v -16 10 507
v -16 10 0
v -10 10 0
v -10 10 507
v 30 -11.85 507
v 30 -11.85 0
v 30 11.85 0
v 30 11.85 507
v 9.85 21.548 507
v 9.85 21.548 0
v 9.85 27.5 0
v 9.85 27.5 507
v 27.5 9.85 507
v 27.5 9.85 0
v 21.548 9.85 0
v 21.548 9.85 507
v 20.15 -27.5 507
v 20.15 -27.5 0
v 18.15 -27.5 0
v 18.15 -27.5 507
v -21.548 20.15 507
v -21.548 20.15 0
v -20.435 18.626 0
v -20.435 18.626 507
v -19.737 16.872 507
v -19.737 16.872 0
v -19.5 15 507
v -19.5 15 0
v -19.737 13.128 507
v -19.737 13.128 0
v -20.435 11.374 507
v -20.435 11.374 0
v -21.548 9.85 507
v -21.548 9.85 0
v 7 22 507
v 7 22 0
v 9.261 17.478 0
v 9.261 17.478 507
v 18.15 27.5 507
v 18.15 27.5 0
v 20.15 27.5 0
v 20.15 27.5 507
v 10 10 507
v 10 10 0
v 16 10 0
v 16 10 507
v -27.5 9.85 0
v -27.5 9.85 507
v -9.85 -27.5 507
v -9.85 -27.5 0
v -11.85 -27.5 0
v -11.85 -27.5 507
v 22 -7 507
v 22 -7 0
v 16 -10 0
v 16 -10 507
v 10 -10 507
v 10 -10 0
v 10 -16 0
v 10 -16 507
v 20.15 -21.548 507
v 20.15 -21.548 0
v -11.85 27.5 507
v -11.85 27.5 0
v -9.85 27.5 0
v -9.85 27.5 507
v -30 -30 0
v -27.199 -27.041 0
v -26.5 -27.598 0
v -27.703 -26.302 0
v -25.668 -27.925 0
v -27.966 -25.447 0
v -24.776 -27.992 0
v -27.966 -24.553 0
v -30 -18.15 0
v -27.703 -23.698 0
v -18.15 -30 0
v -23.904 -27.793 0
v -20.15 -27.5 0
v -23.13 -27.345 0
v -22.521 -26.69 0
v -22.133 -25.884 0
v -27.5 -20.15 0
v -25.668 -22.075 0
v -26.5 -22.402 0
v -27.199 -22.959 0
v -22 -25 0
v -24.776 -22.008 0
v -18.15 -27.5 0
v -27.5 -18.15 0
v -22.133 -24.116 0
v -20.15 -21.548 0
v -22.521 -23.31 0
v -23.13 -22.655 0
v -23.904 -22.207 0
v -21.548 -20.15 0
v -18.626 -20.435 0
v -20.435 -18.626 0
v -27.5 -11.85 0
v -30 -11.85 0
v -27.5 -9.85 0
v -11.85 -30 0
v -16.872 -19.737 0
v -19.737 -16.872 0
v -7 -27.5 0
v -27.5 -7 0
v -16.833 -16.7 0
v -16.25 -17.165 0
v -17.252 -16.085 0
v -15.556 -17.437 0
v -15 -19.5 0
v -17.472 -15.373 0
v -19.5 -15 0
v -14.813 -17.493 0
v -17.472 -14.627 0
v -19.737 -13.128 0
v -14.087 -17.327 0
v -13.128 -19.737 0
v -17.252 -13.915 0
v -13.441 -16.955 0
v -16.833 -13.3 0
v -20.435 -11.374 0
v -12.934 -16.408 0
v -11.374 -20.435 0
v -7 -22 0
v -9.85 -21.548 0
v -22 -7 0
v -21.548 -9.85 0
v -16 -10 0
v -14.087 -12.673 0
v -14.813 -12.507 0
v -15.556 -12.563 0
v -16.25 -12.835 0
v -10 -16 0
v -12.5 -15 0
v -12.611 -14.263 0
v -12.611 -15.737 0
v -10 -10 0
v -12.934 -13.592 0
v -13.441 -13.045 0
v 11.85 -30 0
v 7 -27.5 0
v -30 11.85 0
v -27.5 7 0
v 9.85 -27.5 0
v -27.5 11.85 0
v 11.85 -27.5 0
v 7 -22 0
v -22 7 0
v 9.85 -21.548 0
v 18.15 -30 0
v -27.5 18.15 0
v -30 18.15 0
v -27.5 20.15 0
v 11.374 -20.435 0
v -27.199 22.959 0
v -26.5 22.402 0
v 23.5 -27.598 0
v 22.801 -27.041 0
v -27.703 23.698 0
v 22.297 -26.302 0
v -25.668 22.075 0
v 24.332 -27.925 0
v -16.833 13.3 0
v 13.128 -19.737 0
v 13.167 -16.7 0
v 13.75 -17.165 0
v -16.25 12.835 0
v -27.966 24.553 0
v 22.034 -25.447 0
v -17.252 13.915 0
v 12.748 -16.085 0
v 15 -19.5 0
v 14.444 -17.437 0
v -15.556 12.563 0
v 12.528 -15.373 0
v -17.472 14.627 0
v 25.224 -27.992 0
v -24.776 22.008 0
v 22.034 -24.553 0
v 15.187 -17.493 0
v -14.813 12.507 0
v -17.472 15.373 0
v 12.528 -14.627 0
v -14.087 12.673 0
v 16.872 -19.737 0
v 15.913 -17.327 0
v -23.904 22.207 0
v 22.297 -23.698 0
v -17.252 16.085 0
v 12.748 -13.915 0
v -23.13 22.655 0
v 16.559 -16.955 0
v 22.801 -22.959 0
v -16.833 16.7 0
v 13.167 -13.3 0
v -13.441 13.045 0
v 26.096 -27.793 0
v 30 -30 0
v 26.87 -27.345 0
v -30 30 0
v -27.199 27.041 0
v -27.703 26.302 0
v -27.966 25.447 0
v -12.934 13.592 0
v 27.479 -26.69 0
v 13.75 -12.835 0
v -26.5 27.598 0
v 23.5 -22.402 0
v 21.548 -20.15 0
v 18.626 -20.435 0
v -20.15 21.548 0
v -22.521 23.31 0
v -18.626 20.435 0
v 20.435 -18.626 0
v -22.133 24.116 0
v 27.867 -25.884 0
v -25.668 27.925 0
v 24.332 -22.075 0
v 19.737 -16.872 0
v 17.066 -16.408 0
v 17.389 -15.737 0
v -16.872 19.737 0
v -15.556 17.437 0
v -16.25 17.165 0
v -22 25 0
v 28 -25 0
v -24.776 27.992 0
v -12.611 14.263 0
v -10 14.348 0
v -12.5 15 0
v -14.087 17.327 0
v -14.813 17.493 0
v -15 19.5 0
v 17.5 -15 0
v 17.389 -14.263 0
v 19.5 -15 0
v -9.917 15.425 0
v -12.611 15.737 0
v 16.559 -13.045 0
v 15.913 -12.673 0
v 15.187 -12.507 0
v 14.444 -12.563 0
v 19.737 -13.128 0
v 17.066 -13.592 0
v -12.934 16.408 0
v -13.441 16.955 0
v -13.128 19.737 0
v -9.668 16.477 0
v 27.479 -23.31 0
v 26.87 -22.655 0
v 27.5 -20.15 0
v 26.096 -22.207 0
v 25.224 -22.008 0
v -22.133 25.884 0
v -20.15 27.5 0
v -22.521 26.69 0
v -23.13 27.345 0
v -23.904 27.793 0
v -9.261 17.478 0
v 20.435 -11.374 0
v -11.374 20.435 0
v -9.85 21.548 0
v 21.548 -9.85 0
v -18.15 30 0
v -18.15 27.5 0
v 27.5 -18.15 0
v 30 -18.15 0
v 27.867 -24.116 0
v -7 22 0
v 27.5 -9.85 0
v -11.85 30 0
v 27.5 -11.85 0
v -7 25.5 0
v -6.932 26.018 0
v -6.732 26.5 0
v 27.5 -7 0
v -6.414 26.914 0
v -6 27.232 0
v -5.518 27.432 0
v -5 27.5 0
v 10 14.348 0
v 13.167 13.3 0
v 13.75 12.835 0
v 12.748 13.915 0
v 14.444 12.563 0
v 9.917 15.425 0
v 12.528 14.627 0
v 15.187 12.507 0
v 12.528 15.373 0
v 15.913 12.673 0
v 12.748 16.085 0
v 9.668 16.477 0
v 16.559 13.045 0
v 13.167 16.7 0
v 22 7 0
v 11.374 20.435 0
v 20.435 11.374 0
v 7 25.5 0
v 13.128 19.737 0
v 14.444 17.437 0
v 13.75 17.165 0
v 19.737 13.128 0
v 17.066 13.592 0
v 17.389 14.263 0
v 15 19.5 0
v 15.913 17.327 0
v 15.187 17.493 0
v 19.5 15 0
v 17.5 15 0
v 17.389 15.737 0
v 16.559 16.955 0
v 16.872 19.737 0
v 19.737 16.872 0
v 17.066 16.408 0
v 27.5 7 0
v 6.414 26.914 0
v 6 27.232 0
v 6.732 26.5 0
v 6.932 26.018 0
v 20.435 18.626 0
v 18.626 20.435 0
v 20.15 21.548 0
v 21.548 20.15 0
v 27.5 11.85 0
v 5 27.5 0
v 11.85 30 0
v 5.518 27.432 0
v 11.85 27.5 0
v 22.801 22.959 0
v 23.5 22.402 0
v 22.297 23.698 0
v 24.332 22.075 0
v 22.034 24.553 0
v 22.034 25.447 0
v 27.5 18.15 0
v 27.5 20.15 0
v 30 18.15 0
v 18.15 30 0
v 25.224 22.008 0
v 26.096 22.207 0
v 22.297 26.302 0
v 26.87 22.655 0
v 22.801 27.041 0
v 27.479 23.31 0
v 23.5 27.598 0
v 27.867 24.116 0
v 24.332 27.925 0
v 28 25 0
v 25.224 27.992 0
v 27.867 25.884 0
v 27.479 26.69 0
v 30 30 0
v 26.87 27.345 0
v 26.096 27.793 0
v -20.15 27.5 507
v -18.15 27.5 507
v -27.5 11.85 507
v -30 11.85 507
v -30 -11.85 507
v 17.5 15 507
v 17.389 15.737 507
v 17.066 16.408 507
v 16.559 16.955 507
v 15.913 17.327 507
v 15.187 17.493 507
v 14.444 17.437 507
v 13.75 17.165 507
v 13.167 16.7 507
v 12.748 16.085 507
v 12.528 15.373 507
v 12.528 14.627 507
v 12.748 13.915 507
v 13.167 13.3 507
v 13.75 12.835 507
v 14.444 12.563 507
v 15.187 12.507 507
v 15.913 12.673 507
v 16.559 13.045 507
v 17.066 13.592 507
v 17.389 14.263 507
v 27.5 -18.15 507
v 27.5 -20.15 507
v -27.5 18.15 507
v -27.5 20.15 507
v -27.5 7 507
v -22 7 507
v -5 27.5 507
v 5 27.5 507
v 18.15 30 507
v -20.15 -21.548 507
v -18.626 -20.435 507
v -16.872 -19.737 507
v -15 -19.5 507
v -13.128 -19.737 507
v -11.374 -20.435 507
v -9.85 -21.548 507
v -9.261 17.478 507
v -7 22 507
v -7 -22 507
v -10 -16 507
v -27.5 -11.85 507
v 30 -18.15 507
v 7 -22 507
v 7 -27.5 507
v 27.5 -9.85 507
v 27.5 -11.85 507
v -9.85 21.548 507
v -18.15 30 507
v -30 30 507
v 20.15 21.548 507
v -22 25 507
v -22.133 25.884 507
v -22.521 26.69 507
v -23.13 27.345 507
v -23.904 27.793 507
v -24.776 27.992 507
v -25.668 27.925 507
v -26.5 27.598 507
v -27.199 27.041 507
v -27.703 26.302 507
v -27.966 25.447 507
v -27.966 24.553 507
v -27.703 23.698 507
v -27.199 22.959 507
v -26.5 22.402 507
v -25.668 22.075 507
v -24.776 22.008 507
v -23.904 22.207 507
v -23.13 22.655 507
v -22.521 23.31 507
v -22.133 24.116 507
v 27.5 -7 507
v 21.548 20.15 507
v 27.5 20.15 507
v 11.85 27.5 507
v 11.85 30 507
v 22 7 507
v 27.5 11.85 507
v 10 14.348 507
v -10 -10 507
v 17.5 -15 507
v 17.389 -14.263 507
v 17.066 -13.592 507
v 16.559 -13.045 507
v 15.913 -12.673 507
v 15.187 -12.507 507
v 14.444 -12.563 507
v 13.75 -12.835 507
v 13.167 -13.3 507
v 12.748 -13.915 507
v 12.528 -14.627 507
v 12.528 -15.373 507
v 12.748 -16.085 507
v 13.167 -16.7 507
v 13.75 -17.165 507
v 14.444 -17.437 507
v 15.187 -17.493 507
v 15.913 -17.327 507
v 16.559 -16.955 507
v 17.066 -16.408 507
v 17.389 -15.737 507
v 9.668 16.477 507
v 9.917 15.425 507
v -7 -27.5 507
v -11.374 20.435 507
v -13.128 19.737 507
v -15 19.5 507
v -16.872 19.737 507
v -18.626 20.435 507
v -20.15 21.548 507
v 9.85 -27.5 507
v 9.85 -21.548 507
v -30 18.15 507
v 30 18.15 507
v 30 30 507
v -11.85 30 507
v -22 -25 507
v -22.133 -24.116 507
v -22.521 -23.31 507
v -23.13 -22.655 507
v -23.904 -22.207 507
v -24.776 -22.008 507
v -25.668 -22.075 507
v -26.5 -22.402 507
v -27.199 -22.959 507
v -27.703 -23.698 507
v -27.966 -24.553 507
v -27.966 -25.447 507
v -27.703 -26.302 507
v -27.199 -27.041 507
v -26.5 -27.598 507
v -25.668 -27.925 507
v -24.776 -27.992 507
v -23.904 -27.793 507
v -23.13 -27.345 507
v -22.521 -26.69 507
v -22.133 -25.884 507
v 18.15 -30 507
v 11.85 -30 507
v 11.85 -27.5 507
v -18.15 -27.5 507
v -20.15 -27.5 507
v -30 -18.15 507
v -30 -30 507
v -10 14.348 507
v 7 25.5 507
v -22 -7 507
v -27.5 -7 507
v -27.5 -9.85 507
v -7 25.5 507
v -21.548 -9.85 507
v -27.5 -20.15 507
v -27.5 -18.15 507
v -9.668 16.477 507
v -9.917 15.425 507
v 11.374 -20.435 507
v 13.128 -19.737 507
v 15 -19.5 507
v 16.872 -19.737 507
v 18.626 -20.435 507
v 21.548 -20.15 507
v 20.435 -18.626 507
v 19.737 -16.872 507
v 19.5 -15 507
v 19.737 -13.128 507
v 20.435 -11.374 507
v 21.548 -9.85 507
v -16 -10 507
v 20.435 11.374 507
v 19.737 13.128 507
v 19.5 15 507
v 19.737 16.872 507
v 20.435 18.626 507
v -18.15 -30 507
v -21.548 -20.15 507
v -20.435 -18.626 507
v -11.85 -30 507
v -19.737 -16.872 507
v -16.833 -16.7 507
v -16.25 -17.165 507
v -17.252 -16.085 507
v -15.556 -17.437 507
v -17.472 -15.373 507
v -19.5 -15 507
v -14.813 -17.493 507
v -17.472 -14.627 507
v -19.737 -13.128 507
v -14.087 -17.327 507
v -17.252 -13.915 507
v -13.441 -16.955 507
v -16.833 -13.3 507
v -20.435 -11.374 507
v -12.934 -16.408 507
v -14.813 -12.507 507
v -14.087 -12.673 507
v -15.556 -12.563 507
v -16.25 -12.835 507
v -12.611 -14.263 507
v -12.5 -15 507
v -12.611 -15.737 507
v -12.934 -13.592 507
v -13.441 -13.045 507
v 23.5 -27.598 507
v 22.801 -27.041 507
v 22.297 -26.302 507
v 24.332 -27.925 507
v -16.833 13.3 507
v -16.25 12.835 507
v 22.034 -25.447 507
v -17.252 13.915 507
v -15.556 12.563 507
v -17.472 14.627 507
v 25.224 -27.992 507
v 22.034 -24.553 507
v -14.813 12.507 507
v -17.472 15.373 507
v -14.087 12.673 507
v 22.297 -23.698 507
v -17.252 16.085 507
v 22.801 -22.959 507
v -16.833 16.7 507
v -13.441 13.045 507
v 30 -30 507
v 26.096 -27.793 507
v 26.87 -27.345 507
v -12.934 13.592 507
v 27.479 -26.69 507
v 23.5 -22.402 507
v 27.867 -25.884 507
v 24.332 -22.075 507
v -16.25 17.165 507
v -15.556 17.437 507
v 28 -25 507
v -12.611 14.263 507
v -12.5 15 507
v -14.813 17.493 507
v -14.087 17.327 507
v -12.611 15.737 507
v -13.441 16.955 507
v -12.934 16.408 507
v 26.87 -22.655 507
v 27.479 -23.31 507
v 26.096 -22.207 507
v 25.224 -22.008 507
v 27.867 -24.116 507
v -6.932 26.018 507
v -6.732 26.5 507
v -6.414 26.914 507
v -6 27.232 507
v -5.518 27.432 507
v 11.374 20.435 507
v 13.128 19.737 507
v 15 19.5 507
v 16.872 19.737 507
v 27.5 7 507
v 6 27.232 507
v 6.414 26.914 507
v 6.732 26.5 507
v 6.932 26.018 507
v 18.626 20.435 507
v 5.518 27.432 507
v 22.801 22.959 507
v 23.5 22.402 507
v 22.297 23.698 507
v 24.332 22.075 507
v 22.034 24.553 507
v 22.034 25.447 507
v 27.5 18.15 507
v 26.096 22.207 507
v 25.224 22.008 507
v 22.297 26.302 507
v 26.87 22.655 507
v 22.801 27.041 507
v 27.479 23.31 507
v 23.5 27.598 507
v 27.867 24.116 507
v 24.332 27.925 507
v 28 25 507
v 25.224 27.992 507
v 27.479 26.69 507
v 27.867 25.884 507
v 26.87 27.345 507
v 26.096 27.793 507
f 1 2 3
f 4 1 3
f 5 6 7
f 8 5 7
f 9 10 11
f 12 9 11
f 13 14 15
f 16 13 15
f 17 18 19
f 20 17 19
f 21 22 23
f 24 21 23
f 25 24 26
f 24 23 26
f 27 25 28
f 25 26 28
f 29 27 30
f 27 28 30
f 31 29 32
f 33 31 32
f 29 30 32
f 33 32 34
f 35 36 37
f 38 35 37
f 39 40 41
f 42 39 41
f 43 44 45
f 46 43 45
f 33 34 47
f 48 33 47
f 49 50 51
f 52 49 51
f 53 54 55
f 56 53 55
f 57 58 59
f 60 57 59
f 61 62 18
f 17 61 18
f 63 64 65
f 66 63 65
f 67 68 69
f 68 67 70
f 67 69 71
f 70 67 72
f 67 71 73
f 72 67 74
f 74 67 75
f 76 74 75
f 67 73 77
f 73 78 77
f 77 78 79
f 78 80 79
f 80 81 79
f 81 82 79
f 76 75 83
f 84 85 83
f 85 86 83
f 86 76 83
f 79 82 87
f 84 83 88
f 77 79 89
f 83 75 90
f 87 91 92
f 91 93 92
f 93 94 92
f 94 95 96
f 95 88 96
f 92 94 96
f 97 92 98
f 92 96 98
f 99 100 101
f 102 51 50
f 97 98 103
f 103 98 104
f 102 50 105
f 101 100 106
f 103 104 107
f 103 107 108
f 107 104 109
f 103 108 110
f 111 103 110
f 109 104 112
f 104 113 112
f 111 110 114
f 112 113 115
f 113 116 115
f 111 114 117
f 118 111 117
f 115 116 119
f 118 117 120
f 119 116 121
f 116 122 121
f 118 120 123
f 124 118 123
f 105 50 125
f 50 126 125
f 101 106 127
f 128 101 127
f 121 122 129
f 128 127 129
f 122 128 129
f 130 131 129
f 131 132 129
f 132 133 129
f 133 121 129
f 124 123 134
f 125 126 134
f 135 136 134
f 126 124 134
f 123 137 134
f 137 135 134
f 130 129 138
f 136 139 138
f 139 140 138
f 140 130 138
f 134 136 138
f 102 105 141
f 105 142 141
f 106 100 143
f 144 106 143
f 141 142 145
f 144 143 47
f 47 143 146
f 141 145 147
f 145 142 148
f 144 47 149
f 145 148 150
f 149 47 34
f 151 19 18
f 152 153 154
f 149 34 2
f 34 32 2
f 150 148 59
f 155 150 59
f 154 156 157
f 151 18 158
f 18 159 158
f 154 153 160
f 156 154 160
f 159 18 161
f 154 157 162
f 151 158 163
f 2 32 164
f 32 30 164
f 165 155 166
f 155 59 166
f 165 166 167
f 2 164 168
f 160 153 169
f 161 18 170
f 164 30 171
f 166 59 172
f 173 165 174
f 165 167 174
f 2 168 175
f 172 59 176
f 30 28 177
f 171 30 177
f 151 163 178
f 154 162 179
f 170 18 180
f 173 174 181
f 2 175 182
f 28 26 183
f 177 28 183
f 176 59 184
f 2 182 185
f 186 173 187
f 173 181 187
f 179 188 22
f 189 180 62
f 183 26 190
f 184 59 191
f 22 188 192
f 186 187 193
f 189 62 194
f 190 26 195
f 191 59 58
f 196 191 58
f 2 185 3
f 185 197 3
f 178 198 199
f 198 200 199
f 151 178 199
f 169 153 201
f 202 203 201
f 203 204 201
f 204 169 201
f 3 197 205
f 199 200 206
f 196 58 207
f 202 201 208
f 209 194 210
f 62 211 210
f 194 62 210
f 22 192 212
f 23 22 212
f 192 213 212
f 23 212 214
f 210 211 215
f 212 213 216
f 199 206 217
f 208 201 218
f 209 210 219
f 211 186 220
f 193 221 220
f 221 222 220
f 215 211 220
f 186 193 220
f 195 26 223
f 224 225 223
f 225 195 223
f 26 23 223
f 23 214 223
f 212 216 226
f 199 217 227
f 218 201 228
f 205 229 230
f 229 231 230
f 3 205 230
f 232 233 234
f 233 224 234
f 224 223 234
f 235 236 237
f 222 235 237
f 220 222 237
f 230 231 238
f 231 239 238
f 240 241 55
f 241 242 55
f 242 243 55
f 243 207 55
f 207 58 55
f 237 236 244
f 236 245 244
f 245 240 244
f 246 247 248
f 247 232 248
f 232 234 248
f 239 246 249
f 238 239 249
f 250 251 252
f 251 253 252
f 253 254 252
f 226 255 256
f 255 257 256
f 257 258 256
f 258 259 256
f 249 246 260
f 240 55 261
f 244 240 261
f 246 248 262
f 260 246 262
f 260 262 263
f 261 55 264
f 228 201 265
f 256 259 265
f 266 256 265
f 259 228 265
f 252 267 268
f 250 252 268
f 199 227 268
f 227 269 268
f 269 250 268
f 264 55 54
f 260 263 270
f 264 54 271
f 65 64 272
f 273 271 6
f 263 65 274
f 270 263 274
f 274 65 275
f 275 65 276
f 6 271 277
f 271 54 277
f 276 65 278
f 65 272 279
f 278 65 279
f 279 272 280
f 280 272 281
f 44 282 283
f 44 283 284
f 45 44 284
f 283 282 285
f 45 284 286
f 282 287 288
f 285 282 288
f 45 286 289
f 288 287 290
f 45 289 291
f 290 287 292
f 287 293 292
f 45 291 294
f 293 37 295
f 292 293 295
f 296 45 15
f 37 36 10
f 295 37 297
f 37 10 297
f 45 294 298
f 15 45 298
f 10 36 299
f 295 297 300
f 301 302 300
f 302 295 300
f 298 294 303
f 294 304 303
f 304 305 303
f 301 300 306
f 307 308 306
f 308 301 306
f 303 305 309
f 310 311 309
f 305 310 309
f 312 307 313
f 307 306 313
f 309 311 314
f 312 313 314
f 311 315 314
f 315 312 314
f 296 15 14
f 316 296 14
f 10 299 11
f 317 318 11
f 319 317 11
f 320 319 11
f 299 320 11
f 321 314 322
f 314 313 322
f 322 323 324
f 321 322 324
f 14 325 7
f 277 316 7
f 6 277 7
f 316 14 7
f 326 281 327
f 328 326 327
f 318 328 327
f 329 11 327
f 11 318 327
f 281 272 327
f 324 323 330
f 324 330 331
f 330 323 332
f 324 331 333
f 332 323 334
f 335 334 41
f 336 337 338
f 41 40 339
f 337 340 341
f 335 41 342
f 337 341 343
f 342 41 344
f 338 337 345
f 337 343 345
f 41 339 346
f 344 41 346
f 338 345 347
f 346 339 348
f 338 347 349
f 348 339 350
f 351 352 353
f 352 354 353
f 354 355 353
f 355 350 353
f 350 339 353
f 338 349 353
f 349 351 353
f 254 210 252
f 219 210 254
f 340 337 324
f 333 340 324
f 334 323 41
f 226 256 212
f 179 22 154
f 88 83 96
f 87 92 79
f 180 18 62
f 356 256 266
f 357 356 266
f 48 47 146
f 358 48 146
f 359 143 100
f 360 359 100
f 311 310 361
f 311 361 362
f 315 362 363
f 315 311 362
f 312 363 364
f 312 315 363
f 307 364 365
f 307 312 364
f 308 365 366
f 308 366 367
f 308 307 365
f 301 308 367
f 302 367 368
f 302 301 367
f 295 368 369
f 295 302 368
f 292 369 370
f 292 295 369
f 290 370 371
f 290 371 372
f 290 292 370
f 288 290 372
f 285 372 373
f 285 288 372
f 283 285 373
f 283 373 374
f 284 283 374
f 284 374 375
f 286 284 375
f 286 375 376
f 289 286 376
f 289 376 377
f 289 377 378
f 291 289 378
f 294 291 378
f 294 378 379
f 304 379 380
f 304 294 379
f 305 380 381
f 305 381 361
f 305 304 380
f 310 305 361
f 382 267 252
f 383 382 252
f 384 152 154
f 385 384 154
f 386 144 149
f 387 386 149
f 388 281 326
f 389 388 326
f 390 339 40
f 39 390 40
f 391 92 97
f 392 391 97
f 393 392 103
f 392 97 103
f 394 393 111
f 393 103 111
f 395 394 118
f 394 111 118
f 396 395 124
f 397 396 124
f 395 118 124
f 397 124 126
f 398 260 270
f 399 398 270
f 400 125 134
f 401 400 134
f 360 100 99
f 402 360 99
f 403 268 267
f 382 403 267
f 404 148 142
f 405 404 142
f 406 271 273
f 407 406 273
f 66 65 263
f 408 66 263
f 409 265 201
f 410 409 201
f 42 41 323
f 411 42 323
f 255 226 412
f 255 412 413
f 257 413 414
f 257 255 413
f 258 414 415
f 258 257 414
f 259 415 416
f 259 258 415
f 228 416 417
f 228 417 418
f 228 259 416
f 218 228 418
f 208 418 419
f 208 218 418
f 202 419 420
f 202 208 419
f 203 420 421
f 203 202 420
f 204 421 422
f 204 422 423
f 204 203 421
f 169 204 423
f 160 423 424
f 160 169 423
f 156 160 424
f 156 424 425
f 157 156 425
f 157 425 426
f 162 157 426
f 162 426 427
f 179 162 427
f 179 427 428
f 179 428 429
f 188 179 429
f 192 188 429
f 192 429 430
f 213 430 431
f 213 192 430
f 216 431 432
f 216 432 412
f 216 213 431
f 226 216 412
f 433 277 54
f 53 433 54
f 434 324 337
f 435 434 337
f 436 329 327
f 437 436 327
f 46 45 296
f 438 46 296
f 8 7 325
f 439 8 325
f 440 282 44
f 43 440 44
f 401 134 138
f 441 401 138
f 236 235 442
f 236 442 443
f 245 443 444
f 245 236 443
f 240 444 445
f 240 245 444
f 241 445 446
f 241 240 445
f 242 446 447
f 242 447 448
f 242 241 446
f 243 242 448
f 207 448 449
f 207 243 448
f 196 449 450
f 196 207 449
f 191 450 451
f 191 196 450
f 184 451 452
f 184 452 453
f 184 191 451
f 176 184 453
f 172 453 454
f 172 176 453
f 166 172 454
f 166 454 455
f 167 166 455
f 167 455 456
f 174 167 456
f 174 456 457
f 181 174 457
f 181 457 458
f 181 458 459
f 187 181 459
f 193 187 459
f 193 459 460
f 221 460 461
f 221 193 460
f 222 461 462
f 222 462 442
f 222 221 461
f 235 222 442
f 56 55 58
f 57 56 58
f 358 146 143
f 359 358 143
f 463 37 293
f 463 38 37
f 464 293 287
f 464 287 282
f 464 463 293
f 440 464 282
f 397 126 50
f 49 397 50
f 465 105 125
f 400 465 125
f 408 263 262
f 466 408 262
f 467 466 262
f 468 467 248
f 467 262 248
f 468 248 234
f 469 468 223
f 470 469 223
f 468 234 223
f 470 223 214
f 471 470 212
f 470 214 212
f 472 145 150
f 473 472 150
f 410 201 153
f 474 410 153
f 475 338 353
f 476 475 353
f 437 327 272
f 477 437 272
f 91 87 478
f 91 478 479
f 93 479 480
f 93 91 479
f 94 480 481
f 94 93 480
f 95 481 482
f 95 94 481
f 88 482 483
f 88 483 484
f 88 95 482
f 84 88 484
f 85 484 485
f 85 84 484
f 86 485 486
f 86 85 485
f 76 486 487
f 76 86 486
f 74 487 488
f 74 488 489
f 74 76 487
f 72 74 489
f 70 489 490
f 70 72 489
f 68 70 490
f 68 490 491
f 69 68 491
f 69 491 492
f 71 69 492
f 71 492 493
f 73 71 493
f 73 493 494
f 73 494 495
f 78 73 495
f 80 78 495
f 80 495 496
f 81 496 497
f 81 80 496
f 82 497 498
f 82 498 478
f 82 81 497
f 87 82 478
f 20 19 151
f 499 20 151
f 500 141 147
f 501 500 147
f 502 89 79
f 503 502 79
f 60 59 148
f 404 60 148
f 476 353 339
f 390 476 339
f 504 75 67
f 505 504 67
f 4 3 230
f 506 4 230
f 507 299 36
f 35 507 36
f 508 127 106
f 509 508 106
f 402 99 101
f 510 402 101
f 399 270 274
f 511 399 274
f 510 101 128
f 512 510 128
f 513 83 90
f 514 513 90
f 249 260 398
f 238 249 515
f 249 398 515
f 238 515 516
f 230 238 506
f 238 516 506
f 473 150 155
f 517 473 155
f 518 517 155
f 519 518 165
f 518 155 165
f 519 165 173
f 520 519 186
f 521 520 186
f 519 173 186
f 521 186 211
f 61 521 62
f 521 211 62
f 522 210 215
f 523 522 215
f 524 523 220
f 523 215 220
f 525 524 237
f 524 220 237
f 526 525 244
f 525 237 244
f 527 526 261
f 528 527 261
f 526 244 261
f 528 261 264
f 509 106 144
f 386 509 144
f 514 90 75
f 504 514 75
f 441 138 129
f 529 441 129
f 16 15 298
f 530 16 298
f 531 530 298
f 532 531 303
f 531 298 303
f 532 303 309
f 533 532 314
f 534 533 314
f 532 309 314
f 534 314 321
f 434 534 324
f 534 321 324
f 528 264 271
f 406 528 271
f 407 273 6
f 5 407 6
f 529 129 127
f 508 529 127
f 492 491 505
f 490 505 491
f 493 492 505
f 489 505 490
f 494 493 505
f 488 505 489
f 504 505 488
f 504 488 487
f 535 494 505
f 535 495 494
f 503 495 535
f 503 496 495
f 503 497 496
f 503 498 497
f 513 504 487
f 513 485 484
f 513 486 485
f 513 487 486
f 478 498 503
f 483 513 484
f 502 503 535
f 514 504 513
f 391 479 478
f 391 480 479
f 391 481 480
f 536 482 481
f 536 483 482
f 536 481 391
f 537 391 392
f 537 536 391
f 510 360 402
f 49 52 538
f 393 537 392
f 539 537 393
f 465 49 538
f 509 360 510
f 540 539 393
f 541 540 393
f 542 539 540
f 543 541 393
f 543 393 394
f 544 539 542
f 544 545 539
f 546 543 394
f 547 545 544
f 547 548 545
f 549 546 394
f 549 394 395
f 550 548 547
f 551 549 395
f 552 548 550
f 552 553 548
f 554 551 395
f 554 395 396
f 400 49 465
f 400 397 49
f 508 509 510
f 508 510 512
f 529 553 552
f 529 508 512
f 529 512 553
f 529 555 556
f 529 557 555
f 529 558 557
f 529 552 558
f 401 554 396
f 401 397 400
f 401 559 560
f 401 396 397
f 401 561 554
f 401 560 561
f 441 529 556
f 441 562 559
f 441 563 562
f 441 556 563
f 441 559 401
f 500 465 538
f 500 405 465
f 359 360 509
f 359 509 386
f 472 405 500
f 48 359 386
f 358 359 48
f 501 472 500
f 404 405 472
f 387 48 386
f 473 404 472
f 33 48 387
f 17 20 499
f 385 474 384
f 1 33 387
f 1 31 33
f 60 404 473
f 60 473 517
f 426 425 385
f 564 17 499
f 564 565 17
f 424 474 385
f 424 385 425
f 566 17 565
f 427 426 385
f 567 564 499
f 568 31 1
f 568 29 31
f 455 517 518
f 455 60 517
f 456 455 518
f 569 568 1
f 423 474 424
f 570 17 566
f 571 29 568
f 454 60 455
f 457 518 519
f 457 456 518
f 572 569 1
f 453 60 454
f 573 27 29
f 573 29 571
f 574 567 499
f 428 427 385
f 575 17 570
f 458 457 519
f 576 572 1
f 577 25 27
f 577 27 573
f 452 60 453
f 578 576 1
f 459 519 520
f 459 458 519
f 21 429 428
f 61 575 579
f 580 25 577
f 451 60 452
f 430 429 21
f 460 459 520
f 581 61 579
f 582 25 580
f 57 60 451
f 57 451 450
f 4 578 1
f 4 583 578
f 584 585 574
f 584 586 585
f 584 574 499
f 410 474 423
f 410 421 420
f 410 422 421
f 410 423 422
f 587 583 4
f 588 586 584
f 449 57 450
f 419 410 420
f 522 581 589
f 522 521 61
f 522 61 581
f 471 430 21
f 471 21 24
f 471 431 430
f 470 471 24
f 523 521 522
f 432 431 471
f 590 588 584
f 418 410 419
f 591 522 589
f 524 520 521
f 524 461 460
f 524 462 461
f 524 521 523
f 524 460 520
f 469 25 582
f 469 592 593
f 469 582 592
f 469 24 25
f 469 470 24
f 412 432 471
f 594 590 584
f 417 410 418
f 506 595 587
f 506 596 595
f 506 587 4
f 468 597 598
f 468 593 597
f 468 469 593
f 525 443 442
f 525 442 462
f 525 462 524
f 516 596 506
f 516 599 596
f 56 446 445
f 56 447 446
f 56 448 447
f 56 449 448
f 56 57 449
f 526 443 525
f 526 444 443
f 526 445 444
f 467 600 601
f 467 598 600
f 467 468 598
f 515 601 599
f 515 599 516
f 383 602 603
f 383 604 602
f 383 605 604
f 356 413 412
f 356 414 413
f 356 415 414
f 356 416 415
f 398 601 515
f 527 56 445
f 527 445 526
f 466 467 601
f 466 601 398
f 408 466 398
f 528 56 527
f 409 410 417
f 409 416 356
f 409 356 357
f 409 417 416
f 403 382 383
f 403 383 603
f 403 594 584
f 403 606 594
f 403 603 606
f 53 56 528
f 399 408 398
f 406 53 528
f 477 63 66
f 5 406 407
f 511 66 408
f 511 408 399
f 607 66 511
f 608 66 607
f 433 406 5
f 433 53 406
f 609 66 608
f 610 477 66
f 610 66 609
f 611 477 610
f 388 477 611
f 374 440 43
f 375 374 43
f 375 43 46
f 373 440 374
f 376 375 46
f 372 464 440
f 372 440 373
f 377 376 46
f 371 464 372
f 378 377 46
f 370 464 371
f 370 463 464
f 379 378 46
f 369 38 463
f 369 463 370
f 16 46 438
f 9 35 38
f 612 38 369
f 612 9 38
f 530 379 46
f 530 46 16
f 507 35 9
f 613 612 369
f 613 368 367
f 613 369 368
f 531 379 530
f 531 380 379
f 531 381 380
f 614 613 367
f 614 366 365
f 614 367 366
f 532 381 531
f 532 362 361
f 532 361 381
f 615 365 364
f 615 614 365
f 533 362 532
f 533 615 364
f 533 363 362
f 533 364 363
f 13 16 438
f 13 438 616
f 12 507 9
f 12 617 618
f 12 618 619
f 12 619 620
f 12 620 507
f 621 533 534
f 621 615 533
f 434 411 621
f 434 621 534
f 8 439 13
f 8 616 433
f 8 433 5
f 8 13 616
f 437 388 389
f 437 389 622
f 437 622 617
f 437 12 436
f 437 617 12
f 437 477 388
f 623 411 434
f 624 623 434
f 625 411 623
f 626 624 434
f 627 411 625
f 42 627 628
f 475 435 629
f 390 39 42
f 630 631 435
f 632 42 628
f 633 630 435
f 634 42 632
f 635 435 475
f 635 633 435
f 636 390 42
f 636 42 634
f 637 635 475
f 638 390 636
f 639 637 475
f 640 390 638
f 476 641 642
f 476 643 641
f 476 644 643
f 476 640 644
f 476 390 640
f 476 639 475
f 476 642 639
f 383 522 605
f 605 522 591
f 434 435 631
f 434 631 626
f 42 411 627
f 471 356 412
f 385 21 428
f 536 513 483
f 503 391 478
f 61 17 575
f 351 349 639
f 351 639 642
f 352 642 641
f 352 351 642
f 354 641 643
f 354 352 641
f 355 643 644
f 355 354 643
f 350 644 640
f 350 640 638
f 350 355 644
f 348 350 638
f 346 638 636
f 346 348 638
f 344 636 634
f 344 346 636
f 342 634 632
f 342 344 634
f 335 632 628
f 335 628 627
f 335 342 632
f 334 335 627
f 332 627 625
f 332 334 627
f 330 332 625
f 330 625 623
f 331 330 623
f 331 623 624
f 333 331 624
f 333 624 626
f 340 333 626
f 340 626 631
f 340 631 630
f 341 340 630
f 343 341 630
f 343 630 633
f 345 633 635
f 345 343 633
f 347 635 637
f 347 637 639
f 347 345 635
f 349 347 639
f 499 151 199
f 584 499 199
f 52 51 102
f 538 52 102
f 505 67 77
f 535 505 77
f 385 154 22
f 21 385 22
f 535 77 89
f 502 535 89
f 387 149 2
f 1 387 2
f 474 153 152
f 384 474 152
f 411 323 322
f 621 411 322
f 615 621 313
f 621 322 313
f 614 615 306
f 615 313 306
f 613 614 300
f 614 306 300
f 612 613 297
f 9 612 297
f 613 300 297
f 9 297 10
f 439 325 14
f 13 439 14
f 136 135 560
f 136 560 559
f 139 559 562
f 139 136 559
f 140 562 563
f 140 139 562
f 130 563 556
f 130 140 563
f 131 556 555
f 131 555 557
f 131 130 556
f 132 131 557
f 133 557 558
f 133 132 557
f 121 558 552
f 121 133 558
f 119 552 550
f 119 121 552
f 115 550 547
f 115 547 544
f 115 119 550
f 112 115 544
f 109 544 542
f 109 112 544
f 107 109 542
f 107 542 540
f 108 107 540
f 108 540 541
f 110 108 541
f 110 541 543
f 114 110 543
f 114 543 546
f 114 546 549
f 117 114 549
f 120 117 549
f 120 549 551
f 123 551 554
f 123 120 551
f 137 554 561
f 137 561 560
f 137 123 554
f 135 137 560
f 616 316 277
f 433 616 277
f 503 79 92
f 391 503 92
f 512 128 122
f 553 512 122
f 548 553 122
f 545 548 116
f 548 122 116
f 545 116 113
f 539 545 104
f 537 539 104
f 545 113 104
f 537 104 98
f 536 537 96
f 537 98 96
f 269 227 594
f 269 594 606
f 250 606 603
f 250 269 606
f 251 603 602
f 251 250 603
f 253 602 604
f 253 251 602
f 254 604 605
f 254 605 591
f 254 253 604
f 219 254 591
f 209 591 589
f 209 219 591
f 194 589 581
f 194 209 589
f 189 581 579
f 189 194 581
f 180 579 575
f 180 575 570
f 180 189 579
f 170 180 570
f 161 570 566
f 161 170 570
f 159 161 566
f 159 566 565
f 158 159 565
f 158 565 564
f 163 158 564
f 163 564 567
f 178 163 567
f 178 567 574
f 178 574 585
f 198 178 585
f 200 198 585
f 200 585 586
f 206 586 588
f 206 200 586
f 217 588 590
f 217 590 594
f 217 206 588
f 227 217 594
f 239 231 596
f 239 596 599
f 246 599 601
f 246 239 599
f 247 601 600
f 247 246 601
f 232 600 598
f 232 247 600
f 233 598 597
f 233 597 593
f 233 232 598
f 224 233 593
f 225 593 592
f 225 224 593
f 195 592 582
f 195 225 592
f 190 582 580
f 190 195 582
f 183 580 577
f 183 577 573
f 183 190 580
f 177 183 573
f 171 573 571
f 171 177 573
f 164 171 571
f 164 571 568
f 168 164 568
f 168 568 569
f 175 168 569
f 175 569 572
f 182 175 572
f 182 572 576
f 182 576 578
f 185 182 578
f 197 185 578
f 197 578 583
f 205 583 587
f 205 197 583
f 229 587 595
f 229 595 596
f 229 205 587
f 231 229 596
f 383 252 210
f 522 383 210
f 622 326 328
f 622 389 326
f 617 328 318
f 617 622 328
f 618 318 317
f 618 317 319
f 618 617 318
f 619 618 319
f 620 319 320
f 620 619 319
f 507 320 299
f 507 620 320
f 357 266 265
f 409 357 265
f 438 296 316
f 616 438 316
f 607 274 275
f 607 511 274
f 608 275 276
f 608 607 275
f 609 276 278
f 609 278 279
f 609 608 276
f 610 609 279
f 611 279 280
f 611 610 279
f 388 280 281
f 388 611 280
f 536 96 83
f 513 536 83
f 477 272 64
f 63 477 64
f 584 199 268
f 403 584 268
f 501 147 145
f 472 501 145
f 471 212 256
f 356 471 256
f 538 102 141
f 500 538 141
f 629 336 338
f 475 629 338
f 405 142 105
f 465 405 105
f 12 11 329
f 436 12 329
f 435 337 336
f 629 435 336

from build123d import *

# Parameters (mm, degrees)
F0_R     = 3
F0_R_2   = 2.5
F1_DEPTH = 507
F2_R     = 2
F3_R     = 7


# Not quite as in the source:
# - a feature names something its author has since deleted; it is built from what else it names


with BuildPart() as f1:
    # F0 (on Top) → F1 (new body)
    with BuildSketch(Plane.XY):
        with BuildLine():
            Line((18.15, -30), (30, -30))
            Line((30, -30), (30, -18.15))
            Line((30, -18.15), (27.5, -18.15))
            Line((27.5, -18.15), (27.5, -20.15))
            Line((27.5, -20.15), (21.5477069044, -20.15))
            ThreePointArc((21.5477069044, -20.15), (19.5, -15), (21.5477069044, -9.85))
            Line((21.5477069044, -9.85), (27.5, -9.85))
            Line((27.5, -9.85), (27.5, -11.85))
            Line((27.5, -11.85), (30, -11.85))
            Line((30, -11.85), (30, 11.85))
            Line((30, 11.85), (27.5, 11.85))
            Line((27.5, 11.85), (27.5, 9.85))
            Line((27.5, 9.85), (21.5477069044, 9.85))
            ThreePointArc((21.5477069044, 9.85), (19.5, 15), (21.5477069044, 20.15))
            Line((21.5477069044, 20.15), (27.5, 20.15))
            Line((27.5, 20.15), (27.5, 18.15))
            Line((27.5, 18.15), (30, 18.15))
            Line((30, 18.15), (30, 30))
            Line((30, 30), (18.15, 30))
            Line((18.15, 30), (18.15, 27.5))
            Line((18.15, 27.5), (20.15, 27.5))
            Line((20.15, 27.5), (20.15, 21.5477069044))
            ThreePointArc((20.15, 21.5477069044), (15, 19.5), (9.85, 21.5477069044))
            Line((9.85, 21.5477069044), (9.85, 27.5))
            Line((9.85, 27.5), (11.85, 27.5))
            Line((11.85, 27.5), (11.85, 30))
            Line((11.85, 30), (-11.85, 30))
            Line((-11.85, 30), (-11.85, 27.5))
            Line((-11.85, 27.5), (-9.85, 27.5))
            Line((-9.85, 27.5), (-9.85, 21.5477069044))
            ThreePointArc((-9.85, 21.5477069044), (-15, 19.5), (-20.15, 21.5477069044))
            Line((-20.15, 21.5477069044), (-20.15, 27.5))
            Line((-20.15, 27.5), (-18.15, 27.5))
            Line((-18.15, 27.5), (-18.15, 30))
            Line((-18.15, 30), (-30, 30))
            Line((-30, 30), (-30, 18.15))
            Line((-30, 18.15), (-27.5, 18.15))
            Line((-27.5, 18.15), (-27.5, 20.15))
            Line((-27.5, 20.15), (-21.5477069044, 20.15))
            ThreePointArc((-21.5477069044, 20.15), (-19.5, 15), (-21.5477069044, 9.85))
            Line((-21.5477069044, 9.85), (-27.5, 9.85))
            Line((-27.5, 9.85), (-27.5, 11.85))
            Line((-27.5, 11.85), (-30, 11.85))
            Line((-30, 11.85), (-30, -11.85))
            Line((-30, -11.85), (-27.5, -11.85))
            Line((-27.5, -11.85), (-27.5, -9.85))
            Line((-27.5, -9.85), (-21.5477069044, -9.85))
            ThreePointArc((-21.5477069044, -9.85), (-19.5, -15), (-21.5477069044, -20.15))
            Line((-21.5477069044, -20.15), (-27.5, -20.15))
            Line((-27.5, -20.15), (-27.5, -18.15))
            Line((-27.5, -18.15), (-30, -18.15))
            Line((-30, -18.15), (-30, -30))
            Line((-30, -30), (-18.15, -30))
            Line((-18.15, -30), (-18.15, -27.5))
            Line((-18.15, -27.5), (-20.15, -27.5))
            Line((-20.15, -27.5), (-20.15, -21.5477069044))
            ThreePointArc((-20.15, -21.5477069044), (-15, -19.5), (-9.85, -21.5477069044))
            Line((-9.85, -21.5477069044), (-9.85, -27.5))
            Line((-9.85, -27.5), (-11.85, -27.5))
            Line((-11.85, -27.5), (-11.85, -30))
            Line((-11.85, -30), (11.85, -30))
            Line((11.85, -30), (11.85, -27.5))
            Line((11.85, -27.5), (9.85, -27.5))
            Line((9.85, -27.5), (9.85, -21.5477069044))
            ThreePointArc((9.85, -21.5477069044), (15, -19.5), (20.15, -21.5477069044))
            Line((20.15, -21.5477069044), (20.15, -27.5))
            Line((20.15, -27.5), (18.15, -27.5))
            Line((18.15, -27.5), (18.15, -30))
        make_face()
        with Locations((-25, -25)):
            Circle(F0_R, mode=Mode.SUBTRACT)
        with Locations((-15, -15)):
            Circle(F0_R_2, mode=Mode.SUBTRACT)
        with Locations((25, -25)):
            Circle(F0_R, mode=Mode.SUBTRACT)
        with Locations((15, -15)):
            Circle(F0_R_2, mode=Mode.SUBTRACT)
        with Locations((-25, 25)):
            Circle(F0_R, mode=Mode.SUBTRACT)
        with Locations((-15, 15)):
            Circle(F0_R_2, mode=Mode.SUBTRACT)
        Polygon((-7, 22), (-7, 27.5), (0, 27.5), (7, 27.5), (7, 22), (10, 16), (10, 10), (16, 10), (22, 7), (27.5, 7), (27.5, 0), (27.5, -7), (22, -7), (16, -10), (10, -10), (10, -16), (7, -22), (7, -27.5), (0, -27.5), (-7, -27.5), (-7, -22), (-10, -16), (-10, -10), (-16, -10), (-22, -7), (-27.5, -7), (-27.5, 0), (-27.5, 7), (-22, 7), (-16, 10), (-10, 10), (-10, 16), align=None, mode=Mode.SUBTRACT)
        with Locations((15, 15)):
            Circle(F0_R_2, mode=Mode.SUBTRACT)
        with Locations((25, 25)):
            Circle(F0_R, mode=Mode.SUBTRACT)
    extrude(amount=F1_DEPTH)

    # F2
    f2_edges = [f1.edges().sort_by_distance(p)[0] for p in [
        (-7, 27.5, 253.5),
        (7, 27.5, 253.5),
    ]]
    fillet(f2_edges, radius=F2_R)

    # F3
    f3_edges = [f1.edges().sort_by_distance(p)[0] for p in [
        (-10, 16, 253.5),
        (10, 16, 253.5),
    ]]
    fillet(f3_edges, radius=F3_R)


solid = f1.part
